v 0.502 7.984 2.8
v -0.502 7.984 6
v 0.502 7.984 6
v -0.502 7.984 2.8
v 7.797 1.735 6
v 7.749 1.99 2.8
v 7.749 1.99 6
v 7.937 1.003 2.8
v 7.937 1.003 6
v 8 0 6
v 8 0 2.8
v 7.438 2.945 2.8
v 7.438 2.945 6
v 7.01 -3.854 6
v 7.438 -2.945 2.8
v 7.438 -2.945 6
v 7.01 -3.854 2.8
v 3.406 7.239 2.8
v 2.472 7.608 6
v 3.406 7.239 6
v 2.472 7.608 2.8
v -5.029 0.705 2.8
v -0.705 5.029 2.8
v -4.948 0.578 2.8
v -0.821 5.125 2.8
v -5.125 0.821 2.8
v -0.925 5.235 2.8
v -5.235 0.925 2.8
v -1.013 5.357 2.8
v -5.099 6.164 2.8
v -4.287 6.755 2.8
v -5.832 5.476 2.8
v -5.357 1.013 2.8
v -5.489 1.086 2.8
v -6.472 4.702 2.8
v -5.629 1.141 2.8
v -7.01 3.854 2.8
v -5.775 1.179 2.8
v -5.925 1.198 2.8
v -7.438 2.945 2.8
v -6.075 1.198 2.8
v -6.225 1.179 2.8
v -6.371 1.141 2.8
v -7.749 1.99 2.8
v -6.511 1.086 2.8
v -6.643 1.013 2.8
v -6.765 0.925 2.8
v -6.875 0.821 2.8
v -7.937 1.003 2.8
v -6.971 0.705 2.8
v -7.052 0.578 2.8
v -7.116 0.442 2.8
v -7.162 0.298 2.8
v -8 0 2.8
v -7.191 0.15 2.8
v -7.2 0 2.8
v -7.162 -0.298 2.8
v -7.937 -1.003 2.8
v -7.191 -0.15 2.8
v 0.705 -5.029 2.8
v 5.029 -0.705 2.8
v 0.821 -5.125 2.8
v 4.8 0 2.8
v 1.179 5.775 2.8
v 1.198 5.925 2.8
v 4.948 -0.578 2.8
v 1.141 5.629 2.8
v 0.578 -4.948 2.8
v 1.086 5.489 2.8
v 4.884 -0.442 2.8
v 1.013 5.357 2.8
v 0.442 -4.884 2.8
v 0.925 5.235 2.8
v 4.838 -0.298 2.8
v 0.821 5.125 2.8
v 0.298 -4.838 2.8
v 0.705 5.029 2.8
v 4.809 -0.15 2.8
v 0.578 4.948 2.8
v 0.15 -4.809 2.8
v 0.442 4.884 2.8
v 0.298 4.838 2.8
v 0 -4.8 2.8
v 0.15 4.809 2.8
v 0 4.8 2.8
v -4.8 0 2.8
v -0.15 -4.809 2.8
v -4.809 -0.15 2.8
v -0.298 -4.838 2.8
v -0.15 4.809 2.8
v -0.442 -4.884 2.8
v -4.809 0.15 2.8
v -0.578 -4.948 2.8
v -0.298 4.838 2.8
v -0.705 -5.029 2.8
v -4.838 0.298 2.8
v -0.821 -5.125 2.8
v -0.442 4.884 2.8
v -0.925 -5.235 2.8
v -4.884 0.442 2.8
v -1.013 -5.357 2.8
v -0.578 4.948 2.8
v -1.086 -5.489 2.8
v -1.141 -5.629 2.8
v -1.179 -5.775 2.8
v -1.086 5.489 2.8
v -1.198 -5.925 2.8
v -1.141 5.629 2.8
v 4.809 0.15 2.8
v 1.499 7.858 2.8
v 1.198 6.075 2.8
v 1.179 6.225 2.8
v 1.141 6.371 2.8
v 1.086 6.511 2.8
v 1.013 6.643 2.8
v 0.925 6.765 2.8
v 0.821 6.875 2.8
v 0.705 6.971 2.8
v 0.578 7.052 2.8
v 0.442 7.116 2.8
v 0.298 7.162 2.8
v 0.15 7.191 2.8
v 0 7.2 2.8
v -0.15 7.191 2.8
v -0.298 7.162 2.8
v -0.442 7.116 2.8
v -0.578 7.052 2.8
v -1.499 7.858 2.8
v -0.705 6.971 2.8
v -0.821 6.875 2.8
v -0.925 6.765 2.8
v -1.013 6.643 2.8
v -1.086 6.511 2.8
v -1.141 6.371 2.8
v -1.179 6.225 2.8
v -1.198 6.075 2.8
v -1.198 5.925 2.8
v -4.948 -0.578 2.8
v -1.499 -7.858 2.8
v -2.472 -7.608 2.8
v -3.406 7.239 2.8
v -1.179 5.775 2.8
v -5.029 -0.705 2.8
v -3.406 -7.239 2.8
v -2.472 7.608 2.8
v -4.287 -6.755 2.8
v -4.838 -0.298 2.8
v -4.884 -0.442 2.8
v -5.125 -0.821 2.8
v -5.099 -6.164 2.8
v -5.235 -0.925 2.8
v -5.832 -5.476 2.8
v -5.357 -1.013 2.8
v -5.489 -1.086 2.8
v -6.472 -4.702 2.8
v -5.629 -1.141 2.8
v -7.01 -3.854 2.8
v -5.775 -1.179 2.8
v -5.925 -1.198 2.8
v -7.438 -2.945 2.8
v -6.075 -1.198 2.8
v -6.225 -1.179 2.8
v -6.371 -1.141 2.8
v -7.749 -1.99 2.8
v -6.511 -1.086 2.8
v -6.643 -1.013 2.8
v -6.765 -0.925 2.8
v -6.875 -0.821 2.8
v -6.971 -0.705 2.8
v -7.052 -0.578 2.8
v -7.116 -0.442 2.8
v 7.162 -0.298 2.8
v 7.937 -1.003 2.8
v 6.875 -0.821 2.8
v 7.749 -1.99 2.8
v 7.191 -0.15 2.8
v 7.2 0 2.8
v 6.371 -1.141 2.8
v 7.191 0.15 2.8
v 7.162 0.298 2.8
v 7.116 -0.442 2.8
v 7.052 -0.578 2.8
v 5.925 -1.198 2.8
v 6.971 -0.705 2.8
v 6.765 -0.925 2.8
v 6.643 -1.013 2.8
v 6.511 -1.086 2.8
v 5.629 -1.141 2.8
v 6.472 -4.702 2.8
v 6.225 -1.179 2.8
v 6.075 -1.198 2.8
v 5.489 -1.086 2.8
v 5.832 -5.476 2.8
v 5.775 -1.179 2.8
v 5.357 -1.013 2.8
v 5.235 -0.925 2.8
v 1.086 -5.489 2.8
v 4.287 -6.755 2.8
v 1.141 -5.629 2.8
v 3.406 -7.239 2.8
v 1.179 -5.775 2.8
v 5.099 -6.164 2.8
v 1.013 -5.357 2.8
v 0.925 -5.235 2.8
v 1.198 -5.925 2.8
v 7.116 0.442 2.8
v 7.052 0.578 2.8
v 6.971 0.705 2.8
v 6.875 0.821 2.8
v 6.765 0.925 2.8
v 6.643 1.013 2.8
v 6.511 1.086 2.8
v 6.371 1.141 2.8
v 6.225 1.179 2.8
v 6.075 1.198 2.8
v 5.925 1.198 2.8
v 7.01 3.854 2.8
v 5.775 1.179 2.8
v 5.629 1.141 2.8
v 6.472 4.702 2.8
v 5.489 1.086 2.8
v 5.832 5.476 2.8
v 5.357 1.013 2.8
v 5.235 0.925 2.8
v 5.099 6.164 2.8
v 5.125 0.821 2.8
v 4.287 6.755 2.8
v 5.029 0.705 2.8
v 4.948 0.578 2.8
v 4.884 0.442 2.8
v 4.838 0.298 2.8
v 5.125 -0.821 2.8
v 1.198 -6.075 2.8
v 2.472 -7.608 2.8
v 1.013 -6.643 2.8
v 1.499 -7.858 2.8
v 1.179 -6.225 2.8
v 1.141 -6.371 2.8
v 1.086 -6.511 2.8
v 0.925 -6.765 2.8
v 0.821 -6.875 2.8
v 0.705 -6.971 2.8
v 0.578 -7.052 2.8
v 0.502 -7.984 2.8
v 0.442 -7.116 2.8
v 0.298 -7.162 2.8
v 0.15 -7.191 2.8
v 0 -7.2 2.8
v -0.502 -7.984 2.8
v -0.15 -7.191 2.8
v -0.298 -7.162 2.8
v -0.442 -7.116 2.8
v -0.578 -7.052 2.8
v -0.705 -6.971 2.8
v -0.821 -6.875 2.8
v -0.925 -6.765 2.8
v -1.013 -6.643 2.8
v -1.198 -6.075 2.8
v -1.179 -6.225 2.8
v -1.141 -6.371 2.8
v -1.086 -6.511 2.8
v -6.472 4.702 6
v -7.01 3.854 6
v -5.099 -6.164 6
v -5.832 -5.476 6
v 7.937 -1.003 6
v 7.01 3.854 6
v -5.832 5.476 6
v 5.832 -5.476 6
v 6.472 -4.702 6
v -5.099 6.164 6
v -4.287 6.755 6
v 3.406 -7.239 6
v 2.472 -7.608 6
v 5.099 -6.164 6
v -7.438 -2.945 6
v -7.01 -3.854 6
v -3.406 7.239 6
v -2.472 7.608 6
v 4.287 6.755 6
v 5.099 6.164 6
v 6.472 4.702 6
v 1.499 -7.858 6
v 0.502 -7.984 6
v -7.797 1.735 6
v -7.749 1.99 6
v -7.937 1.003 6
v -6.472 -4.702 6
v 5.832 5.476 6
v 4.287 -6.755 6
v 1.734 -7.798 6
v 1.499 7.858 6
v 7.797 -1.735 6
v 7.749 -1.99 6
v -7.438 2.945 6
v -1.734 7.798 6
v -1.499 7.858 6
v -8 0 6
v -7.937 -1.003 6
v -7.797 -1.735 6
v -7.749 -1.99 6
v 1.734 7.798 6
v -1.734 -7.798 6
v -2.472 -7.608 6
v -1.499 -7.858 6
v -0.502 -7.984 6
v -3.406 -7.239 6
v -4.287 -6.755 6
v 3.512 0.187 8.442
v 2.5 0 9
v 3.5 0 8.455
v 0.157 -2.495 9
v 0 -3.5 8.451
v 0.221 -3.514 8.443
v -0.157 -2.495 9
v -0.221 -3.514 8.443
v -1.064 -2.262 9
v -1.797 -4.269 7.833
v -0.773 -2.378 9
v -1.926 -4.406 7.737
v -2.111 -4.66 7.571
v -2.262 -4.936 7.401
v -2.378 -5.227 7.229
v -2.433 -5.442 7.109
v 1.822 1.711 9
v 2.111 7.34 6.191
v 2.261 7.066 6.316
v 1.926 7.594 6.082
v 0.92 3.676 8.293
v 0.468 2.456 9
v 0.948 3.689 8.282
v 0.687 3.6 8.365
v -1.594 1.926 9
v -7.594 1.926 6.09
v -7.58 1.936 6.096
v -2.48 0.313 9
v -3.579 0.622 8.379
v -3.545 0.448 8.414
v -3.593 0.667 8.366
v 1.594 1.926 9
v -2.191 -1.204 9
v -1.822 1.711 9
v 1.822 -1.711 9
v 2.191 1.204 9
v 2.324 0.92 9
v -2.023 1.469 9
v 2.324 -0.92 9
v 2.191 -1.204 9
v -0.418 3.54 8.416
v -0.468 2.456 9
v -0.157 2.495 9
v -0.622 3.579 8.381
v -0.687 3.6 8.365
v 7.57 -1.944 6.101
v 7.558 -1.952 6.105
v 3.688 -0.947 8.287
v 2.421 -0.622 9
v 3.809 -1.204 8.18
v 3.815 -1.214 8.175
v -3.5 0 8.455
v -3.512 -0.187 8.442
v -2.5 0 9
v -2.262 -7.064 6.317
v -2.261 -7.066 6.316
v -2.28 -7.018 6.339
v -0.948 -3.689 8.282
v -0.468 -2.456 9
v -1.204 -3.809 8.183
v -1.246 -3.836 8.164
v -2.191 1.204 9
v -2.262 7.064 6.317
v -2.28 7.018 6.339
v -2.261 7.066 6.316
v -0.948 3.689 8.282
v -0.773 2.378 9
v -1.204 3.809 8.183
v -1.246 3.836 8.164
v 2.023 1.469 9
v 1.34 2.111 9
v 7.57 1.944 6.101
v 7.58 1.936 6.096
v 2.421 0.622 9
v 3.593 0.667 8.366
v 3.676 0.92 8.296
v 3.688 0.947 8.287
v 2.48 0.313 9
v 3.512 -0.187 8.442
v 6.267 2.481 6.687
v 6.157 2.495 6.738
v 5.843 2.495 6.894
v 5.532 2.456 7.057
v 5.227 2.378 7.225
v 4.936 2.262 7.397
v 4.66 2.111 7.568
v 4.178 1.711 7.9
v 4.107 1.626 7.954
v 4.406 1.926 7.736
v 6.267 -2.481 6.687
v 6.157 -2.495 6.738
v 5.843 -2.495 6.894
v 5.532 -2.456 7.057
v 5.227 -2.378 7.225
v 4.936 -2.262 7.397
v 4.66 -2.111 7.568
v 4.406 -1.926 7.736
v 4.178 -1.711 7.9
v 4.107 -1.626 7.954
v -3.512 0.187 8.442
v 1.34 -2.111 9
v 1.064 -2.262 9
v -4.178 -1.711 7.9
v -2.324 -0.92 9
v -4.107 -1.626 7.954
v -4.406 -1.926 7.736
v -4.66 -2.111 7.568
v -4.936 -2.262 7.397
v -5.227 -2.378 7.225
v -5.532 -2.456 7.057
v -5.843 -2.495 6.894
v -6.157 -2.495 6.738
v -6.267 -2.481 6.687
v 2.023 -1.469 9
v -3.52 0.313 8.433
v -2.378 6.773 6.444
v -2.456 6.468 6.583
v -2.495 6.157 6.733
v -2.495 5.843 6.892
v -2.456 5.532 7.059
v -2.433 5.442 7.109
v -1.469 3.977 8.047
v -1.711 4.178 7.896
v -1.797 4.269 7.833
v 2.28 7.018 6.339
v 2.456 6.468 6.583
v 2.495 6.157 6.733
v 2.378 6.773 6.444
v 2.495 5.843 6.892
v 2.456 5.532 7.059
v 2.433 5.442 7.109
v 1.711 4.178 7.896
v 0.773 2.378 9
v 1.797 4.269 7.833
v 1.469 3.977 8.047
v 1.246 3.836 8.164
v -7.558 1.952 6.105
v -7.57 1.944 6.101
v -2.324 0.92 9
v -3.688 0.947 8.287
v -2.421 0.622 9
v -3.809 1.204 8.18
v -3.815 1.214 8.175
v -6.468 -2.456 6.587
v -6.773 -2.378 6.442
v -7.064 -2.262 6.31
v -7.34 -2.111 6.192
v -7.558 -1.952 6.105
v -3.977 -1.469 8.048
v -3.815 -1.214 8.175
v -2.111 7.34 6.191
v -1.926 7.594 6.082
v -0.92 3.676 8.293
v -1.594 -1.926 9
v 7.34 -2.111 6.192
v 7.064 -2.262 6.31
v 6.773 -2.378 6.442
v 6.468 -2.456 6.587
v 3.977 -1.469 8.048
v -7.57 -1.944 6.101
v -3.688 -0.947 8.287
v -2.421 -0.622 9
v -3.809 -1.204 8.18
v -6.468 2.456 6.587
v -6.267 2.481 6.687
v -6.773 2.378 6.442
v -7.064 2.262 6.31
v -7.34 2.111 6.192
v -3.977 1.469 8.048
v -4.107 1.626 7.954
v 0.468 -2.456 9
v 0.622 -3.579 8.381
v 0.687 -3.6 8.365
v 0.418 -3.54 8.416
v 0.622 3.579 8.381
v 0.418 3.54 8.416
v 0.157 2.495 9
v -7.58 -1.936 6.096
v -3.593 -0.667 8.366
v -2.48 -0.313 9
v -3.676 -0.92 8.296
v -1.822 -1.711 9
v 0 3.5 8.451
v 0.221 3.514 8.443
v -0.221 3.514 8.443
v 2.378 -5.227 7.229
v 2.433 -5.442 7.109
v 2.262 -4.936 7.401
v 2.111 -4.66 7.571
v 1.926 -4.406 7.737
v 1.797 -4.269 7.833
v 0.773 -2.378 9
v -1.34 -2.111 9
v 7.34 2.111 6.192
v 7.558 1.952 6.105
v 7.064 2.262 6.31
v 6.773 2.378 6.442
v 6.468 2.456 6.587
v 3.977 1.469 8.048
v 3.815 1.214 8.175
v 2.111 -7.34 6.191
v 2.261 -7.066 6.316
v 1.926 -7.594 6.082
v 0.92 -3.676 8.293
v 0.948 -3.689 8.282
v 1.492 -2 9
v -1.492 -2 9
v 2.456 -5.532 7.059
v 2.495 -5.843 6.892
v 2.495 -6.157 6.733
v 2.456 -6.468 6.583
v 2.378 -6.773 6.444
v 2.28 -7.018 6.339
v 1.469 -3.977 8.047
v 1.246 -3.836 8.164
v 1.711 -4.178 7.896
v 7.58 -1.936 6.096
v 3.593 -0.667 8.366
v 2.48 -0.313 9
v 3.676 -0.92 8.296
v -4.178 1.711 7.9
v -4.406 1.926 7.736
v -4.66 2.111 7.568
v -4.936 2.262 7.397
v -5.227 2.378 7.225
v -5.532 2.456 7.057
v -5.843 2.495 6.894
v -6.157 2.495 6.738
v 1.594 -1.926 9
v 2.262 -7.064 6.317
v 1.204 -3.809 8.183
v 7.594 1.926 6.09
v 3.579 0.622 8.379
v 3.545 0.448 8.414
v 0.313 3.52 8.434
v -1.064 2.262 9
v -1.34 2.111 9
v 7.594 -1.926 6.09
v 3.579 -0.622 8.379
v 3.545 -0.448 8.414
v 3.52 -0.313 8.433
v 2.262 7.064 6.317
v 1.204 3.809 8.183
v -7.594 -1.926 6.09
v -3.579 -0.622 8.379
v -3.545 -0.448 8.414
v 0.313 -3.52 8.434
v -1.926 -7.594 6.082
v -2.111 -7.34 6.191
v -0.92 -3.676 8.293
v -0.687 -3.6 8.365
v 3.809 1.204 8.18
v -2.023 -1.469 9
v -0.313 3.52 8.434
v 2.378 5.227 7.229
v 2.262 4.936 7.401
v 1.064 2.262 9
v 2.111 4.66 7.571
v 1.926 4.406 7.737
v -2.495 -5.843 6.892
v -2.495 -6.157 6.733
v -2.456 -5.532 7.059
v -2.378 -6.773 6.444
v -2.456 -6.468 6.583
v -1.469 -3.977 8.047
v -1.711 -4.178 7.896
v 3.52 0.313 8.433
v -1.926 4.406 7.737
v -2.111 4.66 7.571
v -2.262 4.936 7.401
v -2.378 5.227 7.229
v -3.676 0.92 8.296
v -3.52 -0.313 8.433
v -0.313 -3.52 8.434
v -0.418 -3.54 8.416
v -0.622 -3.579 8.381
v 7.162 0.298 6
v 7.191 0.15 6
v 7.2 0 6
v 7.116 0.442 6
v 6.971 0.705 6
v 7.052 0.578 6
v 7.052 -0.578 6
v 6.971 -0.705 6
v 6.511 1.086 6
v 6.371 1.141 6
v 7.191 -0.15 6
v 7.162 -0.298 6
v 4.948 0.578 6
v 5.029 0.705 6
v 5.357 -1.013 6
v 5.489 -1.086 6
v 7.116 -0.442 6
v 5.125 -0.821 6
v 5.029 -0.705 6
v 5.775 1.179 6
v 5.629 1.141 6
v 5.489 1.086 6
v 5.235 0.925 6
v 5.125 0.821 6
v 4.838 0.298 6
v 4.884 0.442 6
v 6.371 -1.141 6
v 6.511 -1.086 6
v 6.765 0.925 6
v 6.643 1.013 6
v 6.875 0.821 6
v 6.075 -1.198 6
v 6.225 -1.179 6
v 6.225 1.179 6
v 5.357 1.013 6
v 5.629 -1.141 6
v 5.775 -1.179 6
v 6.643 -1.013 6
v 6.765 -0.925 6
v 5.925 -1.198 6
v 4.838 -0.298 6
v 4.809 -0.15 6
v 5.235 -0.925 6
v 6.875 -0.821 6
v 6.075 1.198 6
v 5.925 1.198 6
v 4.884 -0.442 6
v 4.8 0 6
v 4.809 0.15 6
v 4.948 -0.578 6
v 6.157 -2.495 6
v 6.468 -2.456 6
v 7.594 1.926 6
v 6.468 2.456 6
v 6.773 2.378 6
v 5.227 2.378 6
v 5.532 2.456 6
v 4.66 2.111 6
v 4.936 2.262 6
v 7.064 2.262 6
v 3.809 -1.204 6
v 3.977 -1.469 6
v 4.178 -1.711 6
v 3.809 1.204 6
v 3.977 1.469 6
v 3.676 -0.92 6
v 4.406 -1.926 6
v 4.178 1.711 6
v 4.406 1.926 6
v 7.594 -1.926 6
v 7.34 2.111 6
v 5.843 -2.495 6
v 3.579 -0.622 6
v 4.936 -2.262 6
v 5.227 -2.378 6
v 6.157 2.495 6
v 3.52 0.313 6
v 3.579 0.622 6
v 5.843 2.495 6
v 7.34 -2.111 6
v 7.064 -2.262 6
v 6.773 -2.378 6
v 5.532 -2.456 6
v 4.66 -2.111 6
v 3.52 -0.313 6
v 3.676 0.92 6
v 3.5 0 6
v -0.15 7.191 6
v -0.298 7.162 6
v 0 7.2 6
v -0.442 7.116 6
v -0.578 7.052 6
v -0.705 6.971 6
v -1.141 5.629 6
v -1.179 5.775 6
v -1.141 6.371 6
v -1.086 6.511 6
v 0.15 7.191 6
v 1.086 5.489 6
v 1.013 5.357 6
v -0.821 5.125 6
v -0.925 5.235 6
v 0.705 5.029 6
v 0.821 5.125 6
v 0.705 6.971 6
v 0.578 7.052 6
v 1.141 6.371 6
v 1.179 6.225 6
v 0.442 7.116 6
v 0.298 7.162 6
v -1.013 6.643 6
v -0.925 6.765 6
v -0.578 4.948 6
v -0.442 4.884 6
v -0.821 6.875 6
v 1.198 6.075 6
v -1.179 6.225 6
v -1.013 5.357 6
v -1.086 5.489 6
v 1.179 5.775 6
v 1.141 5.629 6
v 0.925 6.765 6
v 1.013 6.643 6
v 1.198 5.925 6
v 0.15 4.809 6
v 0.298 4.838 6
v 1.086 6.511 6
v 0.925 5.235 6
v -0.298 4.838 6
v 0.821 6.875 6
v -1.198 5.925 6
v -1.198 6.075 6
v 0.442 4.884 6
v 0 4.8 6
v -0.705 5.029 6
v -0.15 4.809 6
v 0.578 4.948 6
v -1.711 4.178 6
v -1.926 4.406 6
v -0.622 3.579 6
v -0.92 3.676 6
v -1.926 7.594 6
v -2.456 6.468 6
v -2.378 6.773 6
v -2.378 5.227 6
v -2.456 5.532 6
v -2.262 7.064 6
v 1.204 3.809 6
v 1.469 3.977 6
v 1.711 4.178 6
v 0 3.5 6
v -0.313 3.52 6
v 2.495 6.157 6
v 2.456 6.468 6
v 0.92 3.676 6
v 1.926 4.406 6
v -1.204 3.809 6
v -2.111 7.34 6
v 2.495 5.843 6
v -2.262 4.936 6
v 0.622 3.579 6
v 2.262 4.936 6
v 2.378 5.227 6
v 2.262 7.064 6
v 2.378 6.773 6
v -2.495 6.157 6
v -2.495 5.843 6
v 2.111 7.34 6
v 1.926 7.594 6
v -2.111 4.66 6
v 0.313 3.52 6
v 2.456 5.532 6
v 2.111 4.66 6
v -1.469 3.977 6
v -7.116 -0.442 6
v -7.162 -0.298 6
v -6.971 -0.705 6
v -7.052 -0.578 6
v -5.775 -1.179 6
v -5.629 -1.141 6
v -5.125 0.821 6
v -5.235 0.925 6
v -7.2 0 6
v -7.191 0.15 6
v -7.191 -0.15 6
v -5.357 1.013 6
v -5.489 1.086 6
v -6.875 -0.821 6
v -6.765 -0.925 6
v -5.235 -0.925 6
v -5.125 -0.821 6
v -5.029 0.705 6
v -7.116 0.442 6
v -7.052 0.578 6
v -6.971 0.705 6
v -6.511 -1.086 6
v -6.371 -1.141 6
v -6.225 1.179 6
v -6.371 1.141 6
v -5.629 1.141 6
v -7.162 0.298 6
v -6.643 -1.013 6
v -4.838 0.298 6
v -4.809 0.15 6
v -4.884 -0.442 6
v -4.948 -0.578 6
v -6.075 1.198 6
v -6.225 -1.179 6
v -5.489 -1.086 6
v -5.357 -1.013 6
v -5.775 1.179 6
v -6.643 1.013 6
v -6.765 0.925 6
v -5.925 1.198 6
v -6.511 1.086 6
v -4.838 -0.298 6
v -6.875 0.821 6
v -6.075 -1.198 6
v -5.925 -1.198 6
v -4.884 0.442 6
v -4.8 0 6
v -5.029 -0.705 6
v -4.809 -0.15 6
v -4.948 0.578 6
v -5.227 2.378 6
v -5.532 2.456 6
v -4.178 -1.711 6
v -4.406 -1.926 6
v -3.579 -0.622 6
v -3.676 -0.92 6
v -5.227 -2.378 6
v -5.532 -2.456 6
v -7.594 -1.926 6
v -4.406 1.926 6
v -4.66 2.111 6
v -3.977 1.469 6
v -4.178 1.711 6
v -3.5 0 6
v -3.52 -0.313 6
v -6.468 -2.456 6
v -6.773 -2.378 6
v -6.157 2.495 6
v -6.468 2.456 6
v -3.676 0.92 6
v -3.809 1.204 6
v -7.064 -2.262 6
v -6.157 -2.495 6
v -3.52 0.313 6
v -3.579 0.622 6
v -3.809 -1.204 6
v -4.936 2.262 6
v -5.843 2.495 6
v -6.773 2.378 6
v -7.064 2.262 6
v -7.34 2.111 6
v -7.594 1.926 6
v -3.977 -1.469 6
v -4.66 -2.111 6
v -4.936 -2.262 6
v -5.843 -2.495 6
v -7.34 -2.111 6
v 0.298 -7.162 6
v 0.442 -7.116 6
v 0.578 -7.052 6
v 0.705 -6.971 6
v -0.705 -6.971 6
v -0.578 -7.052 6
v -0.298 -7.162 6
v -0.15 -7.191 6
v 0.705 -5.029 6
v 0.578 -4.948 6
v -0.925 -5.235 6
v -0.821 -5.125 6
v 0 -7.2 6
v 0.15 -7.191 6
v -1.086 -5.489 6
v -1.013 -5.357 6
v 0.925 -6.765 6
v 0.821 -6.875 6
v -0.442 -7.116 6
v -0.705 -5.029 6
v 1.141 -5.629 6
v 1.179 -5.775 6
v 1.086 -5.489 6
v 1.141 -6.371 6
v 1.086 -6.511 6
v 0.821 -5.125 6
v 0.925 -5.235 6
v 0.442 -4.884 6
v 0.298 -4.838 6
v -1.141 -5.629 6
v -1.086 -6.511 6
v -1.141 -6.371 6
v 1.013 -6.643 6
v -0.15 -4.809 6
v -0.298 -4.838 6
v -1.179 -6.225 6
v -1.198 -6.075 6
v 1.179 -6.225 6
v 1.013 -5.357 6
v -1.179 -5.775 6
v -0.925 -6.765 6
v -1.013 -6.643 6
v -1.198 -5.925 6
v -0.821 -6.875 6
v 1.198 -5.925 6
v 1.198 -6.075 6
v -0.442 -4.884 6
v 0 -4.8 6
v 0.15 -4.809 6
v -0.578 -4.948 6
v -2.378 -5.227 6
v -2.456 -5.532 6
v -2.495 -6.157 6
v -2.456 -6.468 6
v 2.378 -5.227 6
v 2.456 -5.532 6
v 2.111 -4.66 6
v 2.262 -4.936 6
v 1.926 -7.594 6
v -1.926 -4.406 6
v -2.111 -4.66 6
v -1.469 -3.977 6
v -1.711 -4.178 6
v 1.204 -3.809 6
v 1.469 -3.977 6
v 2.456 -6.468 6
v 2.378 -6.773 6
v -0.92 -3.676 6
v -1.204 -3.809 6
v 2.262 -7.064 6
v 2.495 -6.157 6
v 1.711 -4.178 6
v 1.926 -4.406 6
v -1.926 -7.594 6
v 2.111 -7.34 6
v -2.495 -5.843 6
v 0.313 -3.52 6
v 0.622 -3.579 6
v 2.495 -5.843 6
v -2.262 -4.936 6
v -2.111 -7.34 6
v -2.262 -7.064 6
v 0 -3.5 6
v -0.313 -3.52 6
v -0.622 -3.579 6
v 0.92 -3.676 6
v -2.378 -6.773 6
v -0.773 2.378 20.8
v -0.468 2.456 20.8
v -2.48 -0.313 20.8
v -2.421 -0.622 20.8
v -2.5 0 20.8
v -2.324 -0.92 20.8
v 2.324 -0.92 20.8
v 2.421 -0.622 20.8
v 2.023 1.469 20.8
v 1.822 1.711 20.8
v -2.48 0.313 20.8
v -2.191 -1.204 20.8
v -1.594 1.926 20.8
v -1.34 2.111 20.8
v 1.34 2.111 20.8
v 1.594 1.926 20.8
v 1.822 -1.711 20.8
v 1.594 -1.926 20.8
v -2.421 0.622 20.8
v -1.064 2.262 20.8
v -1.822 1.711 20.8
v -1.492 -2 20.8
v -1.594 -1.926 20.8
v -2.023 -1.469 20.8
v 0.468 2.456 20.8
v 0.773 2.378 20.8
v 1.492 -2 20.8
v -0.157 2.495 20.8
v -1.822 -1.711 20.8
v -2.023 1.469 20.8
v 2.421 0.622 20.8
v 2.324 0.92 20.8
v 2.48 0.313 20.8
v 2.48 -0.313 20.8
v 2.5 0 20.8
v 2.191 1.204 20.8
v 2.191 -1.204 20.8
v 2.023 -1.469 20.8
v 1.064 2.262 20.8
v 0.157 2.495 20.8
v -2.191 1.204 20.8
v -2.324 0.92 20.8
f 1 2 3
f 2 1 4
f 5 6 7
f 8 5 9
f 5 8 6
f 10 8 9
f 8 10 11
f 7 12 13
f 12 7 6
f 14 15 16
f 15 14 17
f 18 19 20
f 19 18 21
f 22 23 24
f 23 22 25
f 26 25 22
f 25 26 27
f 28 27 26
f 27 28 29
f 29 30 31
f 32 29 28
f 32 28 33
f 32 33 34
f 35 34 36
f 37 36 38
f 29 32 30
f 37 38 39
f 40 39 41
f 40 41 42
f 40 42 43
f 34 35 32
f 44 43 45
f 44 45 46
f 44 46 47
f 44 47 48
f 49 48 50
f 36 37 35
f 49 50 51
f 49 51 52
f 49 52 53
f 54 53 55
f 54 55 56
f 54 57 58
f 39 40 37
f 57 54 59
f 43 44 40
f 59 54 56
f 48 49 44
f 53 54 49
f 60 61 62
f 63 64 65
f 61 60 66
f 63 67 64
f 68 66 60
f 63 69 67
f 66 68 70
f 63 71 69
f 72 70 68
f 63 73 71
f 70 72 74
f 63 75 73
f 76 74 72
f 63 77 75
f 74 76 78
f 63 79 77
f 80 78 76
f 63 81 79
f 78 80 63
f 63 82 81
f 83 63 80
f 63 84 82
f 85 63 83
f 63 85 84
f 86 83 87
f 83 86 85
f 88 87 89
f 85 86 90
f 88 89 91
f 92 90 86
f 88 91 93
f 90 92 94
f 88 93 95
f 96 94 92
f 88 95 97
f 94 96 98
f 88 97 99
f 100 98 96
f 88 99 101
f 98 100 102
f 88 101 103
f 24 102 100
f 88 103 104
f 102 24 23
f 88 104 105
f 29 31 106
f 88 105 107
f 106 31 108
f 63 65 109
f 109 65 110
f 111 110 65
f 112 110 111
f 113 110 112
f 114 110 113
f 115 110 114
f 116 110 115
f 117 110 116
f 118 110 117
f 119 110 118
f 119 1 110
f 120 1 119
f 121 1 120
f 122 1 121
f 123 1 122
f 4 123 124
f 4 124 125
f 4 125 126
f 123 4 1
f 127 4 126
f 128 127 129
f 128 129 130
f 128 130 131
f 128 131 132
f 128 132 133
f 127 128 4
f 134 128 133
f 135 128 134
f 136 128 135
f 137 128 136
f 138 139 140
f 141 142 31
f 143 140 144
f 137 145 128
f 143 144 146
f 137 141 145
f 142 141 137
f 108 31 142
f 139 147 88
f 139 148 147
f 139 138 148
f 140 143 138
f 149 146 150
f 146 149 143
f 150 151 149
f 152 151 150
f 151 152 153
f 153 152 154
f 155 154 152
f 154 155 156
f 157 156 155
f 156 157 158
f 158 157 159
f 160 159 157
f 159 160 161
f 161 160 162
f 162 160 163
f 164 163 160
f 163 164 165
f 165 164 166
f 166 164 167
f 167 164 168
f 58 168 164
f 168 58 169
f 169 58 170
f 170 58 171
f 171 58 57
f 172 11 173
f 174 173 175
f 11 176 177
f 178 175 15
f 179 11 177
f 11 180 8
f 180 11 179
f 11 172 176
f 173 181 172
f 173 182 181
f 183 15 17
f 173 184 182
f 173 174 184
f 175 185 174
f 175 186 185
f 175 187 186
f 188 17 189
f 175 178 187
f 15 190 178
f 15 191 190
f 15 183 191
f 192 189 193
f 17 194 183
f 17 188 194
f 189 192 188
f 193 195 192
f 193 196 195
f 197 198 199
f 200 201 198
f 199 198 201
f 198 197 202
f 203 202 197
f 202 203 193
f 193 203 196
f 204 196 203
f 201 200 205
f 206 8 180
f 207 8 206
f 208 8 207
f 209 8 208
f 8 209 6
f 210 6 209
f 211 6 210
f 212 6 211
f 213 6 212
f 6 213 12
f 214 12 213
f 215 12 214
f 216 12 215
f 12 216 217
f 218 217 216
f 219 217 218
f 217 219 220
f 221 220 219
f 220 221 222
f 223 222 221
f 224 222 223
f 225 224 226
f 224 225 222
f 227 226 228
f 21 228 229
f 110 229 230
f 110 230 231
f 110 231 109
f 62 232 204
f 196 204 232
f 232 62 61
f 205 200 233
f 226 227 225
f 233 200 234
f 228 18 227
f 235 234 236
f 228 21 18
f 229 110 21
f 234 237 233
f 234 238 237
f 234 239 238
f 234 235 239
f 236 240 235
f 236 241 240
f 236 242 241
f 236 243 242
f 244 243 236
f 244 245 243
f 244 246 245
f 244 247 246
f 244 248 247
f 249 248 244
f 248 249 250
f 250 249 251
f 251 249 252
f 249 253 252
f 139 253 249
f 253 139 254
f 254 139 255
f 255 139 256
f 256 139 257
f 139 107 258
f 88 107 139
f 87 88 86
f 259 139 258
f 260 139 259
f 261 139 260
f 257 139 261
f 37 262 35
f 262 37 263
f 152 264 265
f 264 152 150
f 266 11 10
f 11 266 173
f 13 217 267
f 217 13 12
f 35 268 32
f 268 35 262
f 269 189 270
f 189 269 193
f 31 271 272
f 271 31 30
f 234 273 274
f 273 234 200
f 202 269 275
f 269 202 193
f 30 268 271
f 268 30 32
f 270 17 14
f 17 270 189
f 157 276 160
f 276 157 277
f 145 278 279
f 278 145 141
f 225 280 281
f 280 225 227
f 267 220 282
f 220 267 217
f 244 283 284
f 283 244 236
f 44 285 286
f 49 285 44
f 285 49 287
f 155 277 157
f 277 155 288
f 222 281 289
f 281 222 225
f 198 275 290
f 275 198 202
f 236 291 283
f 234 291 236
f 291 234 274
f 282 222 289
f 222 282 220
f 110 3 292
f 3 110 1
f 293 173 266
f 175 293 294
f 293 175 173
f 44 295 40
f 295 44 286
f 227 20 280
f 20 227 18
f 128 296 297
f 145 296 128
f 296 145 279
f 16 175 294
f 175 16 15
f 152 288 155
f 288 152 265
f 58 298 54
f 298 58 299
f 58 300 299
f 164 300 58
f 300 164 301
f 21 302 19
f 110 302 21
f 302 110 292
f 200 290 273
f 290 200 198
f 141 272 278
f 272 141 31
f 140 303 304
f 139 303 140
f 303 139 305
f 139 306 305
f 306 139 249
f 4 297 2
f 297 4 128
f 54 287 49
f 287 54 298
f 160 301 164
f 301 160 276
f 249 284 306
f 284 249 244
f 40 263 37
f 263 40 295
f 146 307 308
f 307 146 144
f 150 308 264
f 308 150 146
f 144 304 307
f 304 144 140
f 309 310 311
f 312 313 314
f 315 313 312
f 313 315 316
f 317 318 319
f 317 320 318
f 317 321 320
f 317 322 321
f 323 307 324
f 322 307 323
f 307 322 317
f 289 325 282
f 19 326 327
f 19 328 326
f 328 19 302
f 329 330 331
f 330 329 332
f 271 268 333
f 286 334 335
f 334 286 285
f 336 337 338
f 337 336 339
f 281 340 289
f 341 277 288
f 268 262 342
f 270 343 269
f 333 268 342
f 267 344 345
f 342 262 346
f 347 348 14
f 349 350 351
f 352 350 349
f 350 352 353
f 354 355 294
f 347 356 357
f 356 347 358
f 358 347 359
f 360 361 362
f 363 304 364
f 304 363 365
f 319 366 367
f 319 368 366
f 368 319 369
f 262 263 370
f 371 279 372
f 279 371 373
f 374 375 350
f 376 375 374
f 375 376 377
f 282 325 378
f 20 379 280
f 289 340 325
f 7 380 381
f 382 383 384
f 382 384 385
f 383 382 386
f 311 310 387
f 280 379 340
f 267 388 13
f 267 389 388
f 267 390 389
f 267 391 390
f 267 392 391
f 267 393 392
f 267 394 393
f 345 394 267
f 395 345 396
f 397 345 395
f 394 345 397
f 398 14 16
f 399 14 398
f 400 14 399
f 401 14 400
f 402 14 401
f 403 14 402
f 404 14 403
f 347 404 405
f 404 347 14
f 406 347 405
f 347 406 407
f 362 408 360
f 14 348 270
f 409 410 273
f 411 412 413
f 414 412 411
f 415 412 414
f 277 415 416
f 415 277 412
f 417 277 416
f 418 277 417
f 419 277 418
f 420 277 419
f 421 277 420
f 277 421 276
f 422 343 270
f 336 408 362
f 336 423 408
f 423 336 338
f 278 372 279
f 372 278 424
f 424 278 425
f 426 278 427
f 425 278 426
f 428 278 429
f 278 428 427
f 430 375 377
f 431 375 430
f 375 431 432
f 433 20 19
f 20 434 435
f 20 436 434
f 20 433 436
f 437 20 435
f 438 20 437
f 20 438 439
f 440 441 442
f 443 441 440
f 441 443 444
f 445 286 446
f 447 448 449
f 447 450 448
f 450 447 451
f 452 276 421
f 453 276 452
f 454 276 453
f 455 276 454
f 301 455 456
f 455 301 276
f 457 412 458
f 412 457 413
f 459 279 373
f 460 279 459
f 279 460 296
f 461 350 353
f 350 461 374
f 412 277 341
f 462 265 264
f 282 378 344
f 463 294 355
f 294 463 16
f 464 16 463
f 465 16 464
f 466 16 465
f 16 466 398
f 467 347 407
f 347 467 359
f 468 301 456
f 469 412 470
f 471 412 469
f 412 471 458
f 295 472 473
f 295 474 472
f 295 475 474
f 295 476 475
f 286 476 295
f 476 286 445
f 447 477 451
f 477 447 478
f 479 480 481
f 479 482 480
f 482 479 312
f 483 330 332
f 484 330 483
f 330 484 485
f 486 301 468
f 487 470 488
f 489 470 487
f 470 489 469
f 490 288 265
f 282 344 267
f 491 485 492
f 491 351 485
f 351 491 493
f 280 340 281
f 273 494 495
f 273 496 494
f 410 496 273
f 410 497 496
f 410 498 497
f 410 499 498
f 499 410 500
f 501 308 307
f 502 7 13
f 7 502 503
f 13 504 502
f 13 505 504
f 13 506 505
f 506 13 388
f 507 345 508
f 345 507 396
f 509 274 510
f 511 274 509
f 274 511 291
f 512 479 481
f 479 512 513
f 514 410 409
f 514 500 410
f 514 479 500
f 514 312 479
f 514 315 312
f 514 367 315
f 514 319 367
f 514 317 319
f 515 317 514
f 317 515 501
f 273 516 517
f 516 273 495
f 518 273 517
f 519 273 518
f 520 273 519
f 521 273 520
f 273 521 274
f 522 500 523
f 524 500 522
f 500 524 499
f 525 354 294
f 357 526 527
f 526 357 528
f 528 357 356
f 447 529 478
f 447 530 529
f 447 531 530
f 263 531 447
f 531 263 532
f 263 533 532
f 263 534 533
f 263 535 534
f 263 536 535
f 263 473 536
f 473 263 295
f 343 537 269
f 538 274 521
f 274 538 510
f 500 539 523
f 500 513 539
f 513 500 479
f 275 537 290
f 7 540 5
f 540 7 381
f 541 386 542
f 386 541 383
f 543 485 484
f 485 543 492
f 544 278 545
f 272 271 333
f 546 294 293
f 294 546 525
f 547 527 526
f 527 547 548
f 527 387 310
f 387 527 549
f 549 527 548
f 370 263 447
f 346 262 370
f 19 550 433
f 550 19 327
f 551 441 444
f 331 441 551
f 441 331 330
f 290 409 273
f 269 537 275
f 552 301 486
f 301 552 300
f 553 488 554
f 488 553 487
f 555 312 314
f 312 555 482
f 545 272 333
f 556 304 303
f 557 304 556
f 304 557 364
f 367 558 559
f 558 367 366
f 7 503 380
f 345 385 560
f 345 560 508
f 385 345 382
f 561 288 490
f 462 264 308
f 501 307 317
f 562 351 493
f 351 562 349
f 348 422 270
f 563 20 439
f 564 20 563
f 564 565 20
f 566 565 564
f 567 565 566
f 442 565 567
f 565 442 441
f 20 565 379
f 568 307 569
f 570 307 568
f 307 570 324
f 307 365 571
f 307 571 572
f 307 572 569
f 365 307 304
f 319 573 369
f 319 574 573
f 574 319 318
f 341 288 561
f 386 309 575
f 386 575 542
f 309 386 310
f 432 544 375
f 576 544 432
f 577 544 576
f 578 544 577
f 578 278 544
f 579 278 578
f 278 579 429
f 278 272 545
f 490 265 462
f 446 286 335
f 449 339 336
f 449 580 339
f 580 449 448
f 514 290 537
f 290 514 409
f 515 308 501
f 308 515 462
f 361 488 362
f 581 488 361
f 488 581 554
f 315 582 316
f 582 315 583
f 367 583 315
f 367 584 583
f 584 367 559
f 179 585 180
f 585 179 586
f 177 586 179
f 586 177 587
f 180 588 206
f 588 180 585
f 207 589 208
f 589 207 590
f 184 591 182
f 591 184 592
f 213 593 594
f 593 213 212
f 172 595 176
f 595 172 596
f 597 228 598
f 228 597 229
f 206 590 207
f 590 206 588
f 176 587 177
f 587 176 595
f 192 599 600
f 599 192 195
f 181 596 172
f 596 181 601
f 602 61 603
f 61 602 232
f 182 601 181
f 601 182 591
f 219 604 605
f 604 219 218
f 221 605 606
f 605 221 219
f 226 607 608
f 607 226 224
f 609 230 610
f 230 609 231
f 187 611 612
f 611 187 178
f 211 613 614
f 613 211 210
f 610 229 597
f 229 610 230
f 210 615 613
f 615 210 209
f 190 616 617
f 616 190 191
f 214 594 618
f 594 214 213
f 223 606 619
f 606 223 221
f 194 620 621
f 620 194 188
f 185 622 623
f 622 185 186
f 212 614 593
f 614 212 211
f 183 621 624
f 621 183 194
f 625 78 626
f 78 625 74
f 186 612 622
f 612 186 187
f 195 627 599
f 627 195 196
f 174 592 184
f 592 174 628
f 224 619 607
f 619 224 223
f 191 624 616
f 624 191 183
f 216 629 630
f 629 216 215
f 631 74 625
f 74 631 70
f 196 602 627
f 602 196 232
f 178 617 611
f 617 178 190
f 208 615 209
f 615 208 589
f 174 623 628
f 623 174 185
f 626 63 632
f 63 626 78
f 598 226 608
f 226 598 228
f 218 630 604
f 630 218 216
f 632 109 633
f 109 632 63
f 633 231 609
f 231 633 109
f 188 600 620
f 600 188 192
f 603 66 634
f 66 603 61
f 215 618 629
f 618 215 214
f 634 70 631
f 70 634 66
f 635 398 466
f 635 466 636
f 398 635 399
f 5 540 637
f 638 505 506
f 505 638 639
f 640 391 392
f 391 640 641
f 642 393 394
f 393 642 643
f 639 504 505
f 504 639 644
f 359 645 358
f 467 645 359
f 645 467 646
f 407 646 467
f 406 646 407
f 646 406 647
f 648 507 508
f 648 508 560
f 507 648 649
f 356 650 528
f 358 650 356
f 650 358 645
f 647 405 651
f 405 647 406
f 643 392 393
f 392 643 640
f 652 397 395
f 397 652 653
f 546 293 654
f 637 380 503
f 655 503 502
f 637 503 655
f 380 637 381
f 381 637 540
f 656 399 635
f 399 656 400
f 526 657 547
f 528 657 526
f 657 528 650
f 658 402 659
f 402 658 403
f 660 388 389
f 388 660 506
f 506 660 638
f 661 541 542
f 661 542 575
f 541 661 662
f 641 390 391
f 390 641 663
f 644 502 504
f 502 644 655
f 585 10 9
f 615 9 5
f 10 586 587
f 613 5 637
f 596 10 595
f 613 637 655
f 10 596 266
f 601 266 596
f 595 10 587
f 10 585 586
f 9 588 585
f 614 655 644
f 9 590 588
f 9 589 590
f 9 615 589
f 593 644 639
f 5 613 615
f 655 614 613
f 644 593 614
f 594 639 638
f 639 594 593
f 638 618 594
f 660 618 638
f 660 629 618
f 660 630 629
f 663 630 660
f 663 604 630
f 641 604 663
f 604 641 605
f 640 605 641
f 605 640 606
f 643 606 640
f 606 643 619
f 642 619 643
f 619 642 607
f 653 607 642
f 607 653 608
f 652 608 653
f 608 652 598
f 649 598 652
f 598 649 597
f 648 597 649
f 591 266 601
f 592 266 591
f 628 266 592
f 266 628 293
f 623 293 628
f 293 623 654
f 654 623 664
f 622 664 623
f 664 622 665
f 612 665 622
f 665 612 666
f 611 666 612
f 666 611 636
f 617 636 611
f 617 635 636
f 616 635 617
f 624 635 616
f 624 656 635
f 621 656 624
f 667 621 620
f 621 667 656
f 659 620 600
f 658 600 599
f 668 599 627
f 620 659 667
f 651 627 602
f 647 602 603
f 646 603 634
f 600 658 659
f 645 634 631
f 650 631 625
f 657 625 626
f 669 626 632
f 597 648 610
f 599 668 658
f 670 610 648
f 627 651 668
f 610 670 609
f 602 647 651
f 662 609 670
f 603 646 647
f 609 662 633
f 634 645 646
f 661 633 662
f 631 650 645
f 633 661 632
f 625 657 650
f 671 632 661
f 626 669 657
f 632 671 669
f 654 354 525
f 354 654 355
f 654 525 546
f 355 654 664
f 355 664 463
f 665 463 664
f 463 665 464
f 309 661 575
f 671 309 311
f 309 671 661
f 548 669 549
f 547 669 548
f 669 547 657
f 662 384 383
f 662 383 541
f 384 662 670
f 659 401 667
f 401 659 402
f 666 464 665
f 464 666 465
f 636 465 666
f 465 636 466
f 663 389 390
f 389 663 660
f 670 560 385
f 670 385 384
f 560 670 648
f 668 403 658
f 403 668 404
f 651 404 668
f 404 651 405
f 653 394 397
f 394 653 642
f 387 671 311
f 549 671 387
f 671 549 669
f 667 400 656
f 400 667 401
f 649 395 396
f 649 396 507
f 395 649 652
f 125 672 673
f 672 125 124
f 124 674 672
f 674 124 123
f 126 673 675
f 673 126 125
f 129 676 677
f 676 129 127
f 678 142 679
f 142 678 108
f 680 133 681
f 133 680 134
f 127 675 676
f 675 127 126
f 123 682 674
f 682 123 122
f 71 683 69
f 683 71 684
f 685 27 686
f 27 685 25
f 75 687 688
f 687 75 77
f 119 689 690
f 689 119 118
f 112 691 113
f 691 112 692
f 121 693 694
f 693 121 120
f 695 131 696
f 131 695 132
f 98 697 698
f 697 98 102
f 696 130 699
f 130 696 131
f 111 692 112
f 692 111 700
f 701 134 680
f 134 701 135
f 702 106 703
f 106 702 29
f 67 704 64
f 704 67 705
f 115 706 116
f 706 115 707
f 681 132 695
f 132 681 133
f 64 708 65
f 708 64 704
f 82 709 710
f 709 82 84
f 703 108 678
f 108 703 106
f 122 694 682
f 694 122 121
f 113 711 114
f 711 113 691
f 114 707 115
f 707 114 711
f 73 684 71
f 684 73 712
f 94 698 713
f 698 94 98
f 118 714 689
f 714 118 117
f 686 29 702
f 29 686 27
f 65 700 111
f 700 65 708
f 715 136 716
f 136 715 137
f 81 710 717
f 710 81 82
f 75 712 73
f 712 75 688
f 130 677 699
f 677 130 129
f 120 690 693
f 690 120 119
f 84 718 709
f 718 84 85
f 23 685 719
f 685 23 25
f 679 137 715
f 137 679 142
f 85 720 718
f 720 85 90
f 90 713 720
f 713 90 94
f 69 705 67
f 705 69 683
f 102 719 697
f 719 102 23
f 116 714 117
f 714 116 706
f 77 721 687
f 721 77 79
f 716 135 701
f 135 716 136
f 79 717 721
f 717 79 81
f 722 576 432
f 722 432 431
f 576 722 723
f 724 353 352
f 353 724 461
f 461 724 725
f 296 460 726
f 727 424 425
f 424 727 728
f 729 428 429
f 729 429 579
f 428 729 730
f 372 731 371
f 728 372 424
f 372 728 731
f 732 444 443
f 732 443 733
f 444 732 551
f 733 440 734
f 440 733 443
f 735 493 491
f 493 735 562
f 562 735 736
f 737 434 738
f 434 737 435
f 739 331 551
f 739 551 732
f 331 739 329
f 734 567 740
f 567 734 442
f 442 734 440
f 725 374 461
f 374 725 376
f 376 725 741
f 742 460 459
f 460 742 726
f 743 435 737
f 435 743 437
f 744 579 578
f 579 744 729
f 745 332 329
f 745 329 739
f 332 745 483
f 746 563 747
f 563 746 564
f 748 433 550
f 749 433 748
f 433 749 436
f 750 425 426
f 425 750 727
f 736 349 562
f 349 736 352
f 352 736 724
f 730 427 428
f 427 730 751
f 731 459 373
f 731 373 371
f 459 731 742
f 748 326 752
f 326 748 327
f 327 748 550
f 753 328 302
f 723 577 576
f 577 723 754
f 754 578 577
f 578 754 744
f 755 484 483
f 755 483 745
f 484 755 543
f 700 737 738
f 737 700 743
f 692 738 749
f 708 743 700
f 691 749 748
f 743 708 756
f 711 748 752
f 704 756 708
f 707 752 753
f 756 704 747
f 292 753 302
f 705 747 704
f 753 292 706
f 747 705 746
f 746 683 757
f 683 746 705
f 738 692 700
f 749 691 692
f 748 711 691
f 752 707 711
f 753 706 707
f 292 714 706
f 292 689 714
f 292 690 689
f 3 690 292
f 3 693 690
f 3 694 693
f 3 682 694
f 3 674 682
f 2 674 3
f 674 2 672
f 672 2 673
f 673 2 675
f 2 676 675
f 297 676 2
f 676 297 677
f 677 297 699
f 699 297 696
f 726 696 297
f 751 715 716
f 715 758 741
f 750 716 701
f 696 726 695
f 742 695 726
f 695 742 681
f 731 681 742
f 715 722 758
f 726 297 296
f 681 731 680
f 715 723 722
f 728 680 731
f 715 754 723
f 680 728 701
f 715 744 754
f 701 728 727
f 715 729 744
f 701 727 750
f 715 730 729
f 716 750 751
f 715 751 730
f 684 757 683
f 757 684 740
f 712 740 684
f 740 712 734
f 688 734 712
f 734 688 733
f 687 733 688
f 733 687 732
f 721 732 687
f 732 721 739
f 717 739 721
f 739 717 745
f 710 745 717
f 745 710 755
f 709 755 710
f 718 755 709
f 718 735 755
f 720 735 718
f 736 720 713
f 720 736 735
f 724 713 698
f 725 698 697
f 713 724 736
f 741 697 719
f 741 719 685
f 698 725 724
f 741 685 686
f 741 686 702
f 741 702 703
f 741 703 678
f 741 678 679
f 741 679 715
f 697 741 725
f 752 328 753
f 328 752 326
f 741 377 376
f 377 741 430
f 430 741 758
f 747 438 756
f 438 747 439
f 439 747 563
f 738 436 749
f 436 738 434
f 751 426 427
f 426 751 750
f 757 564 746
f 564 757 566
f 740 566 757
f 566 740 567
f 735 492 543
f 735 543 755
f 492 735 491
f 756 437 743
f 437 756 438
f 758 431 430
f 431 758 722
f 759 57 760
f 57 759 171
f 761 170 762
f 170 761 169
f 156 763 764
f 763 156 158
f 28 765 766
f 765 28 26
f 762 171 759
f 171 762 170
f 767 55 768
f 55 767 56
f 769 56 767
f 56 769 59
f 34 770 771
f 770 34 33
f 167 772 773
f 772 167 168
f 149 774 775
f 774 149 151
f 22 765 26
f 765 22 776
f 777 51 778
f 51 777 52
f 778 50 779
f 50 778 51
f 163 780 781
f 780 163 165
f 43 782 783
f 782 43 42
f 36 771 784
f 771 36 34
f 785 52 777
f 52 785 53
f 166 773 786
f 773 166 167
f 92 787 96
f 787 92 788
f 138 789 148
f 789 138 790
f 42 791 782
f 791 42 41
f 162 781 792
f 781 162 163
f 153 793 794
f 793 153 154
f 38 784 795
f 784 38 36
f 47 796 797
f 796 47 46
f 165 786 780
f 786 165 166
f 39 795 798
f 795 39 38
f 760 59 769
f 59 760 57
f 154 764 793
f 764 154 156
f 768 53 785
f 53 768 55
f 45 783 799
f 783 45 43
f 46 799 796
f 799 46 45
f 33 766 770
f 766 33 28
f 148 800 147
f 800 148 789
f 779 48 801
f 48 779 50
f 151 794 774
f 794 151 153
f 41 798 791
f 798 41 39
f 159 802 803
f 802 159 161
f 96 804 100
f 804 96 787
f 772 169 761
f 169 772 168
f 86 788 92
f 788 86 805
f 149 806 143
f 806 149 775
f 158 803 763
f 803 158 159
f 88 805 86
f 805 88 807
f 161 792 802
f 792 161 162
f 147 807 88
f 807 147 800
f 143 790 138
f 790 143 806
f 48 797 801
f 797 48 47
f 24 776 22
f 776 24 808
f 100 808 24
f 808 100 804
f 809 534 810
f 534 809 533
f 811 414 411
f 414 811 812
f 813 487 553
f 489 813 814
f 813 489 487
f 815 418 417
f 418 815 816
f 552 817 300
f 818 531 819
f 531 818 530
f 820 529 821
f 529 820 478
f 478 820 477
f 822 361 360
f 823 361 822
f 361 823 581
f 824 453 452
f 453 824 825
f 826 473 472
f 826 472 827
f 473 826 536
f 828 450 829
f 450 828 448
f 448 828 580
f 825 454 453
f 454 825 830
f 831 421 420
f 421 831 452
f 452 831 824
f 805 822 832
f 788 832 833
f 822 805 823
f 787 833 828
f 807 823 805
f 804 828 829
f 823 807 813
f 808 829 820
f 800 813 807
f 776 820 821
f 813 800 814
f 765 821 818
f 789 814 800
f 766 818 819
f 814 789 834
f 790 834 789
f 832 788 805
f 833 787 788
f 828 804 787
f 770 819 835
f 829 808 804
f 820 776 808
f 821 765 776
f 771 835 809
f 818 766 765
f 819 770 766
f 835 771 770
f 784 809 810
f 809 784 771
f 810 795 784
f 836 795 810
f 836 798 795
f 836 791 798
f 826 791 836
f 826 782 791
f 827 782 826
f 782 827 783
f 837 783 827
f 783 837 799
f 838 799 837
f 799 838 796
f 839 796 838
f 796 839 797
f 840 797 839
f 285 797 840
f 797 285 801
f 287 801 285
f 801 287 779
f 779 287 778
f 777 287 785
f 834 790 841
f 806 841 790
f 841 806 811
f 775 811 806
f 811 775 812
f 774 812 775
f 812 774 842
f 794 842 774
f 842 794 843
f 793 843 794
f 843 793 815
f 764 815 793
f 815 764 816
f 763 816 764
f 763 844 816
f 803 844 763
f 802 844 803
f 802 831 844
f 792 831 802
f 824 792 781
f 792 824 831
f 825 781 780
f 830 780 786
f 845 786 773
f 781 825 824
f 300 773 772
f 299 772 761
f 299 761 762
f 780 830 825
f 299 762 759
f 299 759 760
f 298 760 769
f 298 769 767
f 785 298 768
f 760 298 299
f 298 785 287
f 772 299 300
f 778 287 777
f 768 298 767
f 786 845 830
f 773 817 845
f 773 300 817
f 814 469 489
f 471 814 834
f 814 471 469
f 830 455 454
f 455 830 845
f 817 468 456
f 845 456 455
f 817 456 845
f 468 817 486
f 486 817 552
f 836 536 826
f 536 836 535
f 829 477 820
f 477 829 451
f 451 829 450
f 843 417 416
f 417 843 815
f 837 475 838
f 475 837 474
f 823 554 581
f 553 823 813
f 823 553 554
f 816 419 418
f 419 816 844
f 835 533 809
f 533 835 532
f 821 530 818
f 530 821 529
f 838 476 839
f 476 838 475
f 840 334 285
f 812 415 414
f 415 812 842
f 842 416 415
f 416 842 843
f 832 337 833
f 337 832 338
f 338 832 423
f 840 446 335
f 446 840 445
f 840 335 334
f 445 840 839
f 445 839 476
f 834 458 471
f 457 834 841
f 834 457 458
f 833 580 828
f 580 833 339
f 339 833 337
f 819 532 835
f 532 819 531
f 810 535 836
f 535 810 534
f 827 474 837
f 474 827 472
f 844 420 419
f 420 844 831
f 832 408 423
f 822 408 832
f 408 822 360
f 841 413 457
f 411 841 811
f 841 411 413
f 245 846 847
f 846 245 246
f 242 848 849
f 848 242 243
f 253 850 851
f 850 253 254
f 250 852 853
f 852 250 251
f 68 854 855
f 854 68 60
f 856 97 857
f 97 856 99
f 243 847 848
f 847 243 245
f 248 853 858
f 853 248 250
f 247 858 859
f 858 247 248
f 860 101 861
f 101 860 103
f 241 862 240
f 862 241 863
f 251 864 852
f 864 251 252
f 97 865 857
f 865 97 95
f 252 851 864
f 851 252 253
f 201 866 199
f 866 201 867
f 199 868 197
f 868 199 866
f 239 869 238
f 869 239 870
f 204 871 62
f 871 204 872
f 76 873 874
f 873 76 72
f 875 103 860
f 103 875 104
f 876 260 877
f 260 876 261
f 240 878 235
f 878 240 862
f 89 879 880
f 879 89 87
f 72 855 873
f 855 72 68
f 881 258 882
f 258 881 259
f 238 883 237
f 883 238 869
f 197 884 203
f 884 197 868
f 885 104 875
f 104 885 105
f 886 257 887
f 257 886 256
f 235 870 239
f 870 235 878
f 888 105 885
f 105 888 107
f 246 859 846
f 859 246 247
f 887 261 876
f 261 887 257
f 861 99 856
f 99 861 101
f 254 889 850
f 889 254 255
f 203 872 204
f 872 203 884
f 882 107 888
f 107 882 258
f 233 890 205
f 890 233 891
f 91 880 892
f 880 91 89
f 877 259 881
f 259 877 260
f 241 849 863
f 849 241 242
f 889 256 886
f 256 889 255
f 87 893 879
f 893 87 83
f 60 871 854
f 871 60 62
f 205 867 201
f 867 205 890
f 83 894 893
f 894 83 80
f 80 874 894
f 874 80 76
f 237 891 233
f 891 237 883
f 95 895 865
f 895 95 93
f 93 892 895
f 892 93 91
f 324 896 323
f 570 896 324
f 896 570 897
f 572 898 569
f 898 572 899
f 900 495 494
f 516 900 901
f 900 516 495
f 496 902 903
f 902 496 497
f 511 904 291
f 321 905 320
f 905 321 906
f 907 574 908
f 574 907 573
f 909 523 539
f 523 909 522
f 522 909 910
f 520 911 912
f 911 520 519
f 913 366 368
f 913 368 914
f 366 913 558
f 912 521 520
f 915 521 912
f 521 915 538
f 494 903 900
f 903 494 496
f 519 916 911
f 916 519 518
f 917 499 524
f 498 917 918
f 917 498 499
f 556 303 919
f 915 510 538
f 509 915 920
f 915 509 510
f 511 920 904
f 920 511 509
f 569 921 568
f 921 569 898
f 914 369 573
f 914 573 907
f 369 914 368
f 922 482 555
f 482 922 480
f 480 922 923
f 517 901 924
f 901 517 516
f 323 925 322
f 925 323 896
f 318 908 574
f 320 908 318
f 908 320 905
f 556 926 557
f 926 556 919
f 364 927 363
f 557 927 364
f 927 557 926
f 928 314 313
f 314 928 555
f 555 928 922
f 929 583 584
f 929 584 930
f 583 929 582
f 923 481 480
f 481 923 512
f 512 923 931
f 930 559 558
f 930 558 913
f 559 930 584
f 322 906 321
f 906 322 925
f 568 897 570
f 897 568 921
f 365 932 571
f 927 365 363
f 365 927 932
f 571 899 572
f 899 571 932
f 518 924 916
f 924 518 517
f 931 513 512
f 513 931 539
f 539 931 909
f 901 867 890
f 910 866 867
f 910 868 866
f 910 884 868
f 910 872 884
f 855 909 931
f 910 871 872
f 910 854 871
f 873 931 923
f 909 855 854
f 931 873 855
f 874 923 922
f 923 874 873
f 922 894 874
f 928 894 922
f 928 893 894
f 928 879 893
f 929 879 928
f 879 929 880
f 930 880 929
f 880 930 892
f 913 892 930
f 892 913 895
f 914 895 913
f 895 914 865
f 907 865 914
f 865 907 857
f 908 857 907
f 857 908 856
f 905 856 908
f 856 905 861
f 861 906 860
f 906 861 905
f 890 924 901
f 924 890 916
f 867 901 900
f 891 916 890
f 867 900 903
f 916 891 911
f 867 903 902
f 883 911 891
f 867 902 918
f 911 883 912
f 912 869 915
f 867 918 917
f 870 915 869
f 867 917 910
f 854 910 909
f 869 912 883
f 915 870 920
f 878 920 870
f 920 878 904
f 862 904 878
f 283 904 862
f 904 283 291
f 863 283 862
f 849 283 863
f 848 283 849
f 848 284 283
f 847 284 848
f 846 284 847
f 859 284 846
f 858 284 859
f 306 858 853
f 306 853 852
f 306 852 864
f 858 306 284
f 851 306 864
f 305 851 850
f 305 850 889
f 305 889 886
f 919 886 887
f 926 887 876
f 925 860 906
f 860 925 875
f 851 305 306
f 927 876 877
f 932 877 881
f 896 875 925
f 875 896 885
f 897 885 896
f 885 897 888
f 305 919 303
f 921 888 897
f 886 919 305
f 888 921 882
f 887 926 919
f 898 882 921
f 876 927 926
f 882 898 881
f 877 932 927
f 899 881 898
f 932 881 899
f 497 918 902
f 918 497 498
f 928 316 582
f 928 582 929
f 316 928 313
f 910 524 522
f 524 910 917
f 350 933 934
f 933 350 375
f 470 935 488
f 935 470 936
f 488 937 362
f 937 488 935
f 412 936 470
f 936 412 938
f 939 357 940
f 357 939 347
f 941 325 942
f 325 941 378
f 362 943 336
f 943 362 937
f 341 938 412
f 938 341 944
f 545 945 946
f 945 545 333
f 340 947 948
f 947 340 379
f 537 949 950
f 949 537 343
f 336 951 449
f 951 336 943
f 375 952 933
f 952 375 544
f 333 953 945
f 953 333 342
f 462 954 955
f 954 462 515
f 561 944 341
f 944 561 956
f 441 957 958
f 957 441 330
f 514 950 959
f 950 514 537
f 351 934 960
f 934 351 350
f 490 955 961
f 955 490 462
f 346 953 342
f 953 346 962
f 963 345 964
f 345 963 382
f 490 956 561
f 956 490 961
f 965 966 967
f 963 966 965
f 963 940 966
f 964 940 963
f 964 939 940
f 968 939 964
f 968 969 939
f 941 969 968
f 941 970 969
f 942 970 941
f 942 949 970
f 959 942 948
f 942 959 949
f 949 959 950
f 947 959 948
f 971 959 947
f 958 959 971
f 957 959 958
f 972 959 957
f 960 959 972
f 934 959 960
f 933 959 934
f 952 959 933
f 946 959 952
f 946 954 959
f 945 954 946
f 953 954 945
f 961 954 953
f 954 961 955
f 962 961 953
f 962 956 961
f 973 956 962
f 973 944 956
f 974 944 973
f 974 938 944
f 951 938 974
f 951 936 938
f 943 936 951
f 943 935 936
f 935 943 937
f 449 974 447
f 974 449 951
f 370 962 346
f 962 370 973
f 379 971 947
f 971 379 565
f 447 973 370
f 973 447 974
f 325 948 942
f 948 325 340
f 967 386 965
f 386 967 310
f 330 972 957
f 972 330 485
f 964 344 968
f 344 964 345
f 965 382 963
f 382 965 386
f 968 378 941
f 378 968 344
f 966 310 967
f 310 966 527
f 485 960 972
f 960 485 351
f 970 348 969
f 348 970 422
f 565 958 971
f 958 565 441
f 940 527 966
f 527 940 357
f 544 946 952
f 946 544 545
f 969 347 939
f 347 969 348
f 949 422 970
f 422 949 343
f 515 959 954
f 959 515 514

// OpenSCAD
/*
 * Dynamixel Motor Model
 * Parametric OpenSCAD model for Dynamixel servo motors
 * Default dimensions based on XL330-M288-T
 * 
 * Author: Generated for Orbigator project
 * Date: 2025-12-13
 */

// Main parameters for XL330-M288-T
// All dimensions in mm
motor_width = 20;           // Width of motor body
motor_depth = 34;           // Depth of motor body
motor_height = 23;        // Height of motor body (excluding horn)
shaft_offset_from_top = 9.5; // Distance from top of motor to shaft center

// Horn parameters
horn_diameter = 16;       // Diameter of output horn
horn_height = 2.8;          // Height of horn above body
horn_screw_diameter = 2;    // Center screw hole
screw_head_diameter = 3.75;
horn_mount_holes = 4;       // Number of mounting holes in horn
horn_mount_radius = 6;      // Radius of mounting holes from center
horn_mount_hole_dia = 2;    // Diameter of mounting holes
horn_mount_hole_xtra = 0.4;  // extra diameter for mounting screws
horn_mount_head_dia = 5;    // Diameter of mounting holes

// Side mounting bracket parameters
bracket_width = 24;         // Width of mounting bracket
bracket_height = 5;         // Height of mounting bracket
bracket_thickness = 3;      // Thickness of bracket
bracket_hole_spacing_x = 16;  // Distance between mounting holes
bracket_hole_spacing_y = 30;  // Distance between mounting holes
bracket_hole_diameter = 2; // Mounting hole diameter

// Cable parameters
cable_width = 4;            // Width of cable connector
cable_height = 3;           // Height of cable connector
cable_depth = 6;            // Depth of cable connector

// Drive shaft adapter parameters
adapter_base_height = 3.2;   // Height of base that sits on horn
taper_height = 3;            // Height of tapered transition
shaft_diameter = 5;          // Diameter of D-shaft
shaft_height = 18;           // Total height of shaft (7 + 11)
d_flat_width = 0.5;          // Width of flat on D-shaft
// Safe screw depth: goes through adapter base + into horn, but NOT through horn to motor body
// Leave 0.5mm safety margin to prevent bottoming out on motor
screw_depth = adapter_base_height + horn_height - 0.5;

// Rendering quality
$fn = 50;

// Main module
module dynamixel_xl330(show_horn=true, show_bracket=true, show_cable=true) {
  translate([0, -(motor_depth/2-shaft_offset_from_top), -motor_height-horn_height+horn_height])
    {
      color("DarkSlateGray") {
        // Main motor body
        difference() {
	  // Main rectangular body
	  translate([0, 0, motor_height/2])
	    cube([motor_width, motor_depth, motor_height], center=true);
            
	  // Mounting bracket cutouts (if brackets are shown separately)
	  if (!show_bracket) {
	    // Top bracket cutout
	    translate([0, 0, motor_height - bracket_thickness/2])
	      cube([motor_width + 0.1, bracket_width + 0.1, bracket_thickness + 0.1], center=true);
	  }
            
	  // Mounting holes through the body (4 holes at corners)
	  // Based on technical drawing - holes are on 18mm spacing
	  for (x = [-1, 1]) {
	    for (y = [-1, 1]) {
	      translate([x * bracket_hole_spacing_x / 2, y * bracket_hole_spacing_y / 2, motor_height/2])
		cylinder(h=motor_height*2, d=bracket_hole_diameter, center=true);
	    }
	  }
        }
      }
    
      // Output horn (positioned at shaft_z)
      if (show_horn) {
        color("White", 0.9) {
	  translate([0, motor_depth/2-shaft_offset_from_top, motor_height]) {
	    difference() {
	      // Horn cylinder
	      cylinder(h=horn_height, d=horn_diameter);
                    
	      // Center screw hole
	      translate([0, 0, -0.1])
		cylinder(h=horn_height + 0.2, d=horn_screw_diameter);
                    
	      // Mounting holes around horn
	      for (i = [0:horn_mount_holes-1]) {
		rotate([0, 0, i * 360/horn_mount_holes])
		  translate([horn_mount_radius, 0, -0.1])
		  cylinder(h=horn_height + 100, d=horn_mount_hole_dia,center=true);
	      }
	    }
                
	    // Horn spline (simplified as cross pattern)
	    for (i = [0:3]) {
	      rotate([0, 0, i * 90])
		translate([0, 0, horn_height/2])
		cube([horn_diameter * 0.6, 1.5, horn_height], center=true);
	    }
	  }
        }
      }
    }
}
module dynamixel_mounting_screws(){
  translate([0, -(motor_depth/2-shaft_offset_from_top), -motor_height-horn_height+horn_height])
  for (x = [-1, 1]) {
    for (y = [-1, 1]) {
      translate([x * bracket_hole_spacing_x / 2, y * bracket_hole_spacing_y / 2, motor_height/2])
	cylinder(h=motor_height*2, d=bracket_hole_diameter, center=true);
      translate([x * bracket_hole_spacing_x / 2, y * bracket_hole_spacing_y / 2, motor_height*2+1])
	cylinder(h=motor_height*2, d=screw_head_diameter, center=true);
    }
  }
}

// Mounting bracket module (can be used separately for assemblies)
module dynamixel_bracket(thickness=3) {
    difference() {
        cube([motor_width, bracket_width, thickness], center=true);
        
        // Mounting holes
        for (y = [-1, 1]) {
            translate([0, y * bracket_hole_spacing/2, 0])
                cylinder(h=thickness + 0.2, d=bracket_hole_diameter, center=true);
        }
    }
}

// Horn module (can be used separately)
module dynamixel_horn() {
    difference() {
        // Horn cylinder
        cylinder(h=horn_height, d=horn_diameter);
        
        // Center screw hole
        translate([0, 0, -0.1])
            cylinder(h=horn_height + 0.2, d=horn_screw_diameter);
        
        // Mounting holes around horn
        for (i = [0:horn_mount_holes-1]) {
            rotate([0, 0, i * 360/horn_mount_holes])
                translate([horn_mount_radius, 0, -0.1])
                    cylinder(h=horn_height + 0.2, d=horn_mount_hole_dia);
        }
    }
    
    // Horn spline
    for (i = [0:3]) {
        rotate([0, 0, i * 90])
            translate([0, 0, horn_height/2])
                cube([horn_diameter * 0.6, 1.5, horn_height], center=true);
    }
}

// Drive shaft adapter module
// Mounts to DYNAMIXEL horn and provides D-shaft output
module dynamixel_drive_shaft(){
  translate([0, 0, horn_height]){
    difference(){
      union(){
        // Base adapter that sits on horn
	cylinder(d=horn_diameter, h=adapter_base_height);
        // Tapered transition from horn to shaft
	translate([0, 0, adapter_base_height])
          cylinder(d2=shaft_diameter, d1=horn_diameter, h=taper_height);
      }
      // Mounting holes for self-tapping screws
      for (i = [0:horn_mount_holes-1]) {
        // Through holes for screw shafts
	rotate([0, 0, i * 360/horn_mount_holes])
	  translate([horn_mount_radius, 0, -1])
	  cylinder(h=screw_depth, d=horn_mount_hole_dia+horn_mount_hole_xtra);
        // Countersink for screw heads
	rotate([0, 0, i * 360/horn_mount_holes])
	  translate([horn_mount_radius, 0, adapter_base_height])
	  cylinder(h=screw_depth, d=horn_mount_head_dia);
      }
    }
    // D-shaft output (rotated 180° for orientation)
    rotate([0, 0, 180])
      difference(){
        // Main shaft cylinder
        cylinder(d=shaft_diameter, h=shaft_height);
        // Cut flat to create D-profile
        translate([-shaft_diameter, shaft_diameter/2 - d_flat_width, 0])
          cube([shaft_diameter*2, shaft_diameter, shaft_height + screw_depth]);
    }
  }
}
translate([0, 0, 0])color("grey")dynamixel_drive_shaft();

// Example usage: Single motor
//dynamixel_xl330(show_horn=true, show_bracket=true, show_cable=true);
//dynamixel_mounting_screws();
// Example: Daisy chain configuration (uncomment to see)
/*
for (i = [0:1]) {
    translate([0, i * (motor_depth + 5), 0])
        dynamixel_xl330();
}
*/

// Example: Motor without horn (uncomment to see)
/*
translate([40, 0, 0])
    dynamixel_xl330(show_horn=false);
*/
